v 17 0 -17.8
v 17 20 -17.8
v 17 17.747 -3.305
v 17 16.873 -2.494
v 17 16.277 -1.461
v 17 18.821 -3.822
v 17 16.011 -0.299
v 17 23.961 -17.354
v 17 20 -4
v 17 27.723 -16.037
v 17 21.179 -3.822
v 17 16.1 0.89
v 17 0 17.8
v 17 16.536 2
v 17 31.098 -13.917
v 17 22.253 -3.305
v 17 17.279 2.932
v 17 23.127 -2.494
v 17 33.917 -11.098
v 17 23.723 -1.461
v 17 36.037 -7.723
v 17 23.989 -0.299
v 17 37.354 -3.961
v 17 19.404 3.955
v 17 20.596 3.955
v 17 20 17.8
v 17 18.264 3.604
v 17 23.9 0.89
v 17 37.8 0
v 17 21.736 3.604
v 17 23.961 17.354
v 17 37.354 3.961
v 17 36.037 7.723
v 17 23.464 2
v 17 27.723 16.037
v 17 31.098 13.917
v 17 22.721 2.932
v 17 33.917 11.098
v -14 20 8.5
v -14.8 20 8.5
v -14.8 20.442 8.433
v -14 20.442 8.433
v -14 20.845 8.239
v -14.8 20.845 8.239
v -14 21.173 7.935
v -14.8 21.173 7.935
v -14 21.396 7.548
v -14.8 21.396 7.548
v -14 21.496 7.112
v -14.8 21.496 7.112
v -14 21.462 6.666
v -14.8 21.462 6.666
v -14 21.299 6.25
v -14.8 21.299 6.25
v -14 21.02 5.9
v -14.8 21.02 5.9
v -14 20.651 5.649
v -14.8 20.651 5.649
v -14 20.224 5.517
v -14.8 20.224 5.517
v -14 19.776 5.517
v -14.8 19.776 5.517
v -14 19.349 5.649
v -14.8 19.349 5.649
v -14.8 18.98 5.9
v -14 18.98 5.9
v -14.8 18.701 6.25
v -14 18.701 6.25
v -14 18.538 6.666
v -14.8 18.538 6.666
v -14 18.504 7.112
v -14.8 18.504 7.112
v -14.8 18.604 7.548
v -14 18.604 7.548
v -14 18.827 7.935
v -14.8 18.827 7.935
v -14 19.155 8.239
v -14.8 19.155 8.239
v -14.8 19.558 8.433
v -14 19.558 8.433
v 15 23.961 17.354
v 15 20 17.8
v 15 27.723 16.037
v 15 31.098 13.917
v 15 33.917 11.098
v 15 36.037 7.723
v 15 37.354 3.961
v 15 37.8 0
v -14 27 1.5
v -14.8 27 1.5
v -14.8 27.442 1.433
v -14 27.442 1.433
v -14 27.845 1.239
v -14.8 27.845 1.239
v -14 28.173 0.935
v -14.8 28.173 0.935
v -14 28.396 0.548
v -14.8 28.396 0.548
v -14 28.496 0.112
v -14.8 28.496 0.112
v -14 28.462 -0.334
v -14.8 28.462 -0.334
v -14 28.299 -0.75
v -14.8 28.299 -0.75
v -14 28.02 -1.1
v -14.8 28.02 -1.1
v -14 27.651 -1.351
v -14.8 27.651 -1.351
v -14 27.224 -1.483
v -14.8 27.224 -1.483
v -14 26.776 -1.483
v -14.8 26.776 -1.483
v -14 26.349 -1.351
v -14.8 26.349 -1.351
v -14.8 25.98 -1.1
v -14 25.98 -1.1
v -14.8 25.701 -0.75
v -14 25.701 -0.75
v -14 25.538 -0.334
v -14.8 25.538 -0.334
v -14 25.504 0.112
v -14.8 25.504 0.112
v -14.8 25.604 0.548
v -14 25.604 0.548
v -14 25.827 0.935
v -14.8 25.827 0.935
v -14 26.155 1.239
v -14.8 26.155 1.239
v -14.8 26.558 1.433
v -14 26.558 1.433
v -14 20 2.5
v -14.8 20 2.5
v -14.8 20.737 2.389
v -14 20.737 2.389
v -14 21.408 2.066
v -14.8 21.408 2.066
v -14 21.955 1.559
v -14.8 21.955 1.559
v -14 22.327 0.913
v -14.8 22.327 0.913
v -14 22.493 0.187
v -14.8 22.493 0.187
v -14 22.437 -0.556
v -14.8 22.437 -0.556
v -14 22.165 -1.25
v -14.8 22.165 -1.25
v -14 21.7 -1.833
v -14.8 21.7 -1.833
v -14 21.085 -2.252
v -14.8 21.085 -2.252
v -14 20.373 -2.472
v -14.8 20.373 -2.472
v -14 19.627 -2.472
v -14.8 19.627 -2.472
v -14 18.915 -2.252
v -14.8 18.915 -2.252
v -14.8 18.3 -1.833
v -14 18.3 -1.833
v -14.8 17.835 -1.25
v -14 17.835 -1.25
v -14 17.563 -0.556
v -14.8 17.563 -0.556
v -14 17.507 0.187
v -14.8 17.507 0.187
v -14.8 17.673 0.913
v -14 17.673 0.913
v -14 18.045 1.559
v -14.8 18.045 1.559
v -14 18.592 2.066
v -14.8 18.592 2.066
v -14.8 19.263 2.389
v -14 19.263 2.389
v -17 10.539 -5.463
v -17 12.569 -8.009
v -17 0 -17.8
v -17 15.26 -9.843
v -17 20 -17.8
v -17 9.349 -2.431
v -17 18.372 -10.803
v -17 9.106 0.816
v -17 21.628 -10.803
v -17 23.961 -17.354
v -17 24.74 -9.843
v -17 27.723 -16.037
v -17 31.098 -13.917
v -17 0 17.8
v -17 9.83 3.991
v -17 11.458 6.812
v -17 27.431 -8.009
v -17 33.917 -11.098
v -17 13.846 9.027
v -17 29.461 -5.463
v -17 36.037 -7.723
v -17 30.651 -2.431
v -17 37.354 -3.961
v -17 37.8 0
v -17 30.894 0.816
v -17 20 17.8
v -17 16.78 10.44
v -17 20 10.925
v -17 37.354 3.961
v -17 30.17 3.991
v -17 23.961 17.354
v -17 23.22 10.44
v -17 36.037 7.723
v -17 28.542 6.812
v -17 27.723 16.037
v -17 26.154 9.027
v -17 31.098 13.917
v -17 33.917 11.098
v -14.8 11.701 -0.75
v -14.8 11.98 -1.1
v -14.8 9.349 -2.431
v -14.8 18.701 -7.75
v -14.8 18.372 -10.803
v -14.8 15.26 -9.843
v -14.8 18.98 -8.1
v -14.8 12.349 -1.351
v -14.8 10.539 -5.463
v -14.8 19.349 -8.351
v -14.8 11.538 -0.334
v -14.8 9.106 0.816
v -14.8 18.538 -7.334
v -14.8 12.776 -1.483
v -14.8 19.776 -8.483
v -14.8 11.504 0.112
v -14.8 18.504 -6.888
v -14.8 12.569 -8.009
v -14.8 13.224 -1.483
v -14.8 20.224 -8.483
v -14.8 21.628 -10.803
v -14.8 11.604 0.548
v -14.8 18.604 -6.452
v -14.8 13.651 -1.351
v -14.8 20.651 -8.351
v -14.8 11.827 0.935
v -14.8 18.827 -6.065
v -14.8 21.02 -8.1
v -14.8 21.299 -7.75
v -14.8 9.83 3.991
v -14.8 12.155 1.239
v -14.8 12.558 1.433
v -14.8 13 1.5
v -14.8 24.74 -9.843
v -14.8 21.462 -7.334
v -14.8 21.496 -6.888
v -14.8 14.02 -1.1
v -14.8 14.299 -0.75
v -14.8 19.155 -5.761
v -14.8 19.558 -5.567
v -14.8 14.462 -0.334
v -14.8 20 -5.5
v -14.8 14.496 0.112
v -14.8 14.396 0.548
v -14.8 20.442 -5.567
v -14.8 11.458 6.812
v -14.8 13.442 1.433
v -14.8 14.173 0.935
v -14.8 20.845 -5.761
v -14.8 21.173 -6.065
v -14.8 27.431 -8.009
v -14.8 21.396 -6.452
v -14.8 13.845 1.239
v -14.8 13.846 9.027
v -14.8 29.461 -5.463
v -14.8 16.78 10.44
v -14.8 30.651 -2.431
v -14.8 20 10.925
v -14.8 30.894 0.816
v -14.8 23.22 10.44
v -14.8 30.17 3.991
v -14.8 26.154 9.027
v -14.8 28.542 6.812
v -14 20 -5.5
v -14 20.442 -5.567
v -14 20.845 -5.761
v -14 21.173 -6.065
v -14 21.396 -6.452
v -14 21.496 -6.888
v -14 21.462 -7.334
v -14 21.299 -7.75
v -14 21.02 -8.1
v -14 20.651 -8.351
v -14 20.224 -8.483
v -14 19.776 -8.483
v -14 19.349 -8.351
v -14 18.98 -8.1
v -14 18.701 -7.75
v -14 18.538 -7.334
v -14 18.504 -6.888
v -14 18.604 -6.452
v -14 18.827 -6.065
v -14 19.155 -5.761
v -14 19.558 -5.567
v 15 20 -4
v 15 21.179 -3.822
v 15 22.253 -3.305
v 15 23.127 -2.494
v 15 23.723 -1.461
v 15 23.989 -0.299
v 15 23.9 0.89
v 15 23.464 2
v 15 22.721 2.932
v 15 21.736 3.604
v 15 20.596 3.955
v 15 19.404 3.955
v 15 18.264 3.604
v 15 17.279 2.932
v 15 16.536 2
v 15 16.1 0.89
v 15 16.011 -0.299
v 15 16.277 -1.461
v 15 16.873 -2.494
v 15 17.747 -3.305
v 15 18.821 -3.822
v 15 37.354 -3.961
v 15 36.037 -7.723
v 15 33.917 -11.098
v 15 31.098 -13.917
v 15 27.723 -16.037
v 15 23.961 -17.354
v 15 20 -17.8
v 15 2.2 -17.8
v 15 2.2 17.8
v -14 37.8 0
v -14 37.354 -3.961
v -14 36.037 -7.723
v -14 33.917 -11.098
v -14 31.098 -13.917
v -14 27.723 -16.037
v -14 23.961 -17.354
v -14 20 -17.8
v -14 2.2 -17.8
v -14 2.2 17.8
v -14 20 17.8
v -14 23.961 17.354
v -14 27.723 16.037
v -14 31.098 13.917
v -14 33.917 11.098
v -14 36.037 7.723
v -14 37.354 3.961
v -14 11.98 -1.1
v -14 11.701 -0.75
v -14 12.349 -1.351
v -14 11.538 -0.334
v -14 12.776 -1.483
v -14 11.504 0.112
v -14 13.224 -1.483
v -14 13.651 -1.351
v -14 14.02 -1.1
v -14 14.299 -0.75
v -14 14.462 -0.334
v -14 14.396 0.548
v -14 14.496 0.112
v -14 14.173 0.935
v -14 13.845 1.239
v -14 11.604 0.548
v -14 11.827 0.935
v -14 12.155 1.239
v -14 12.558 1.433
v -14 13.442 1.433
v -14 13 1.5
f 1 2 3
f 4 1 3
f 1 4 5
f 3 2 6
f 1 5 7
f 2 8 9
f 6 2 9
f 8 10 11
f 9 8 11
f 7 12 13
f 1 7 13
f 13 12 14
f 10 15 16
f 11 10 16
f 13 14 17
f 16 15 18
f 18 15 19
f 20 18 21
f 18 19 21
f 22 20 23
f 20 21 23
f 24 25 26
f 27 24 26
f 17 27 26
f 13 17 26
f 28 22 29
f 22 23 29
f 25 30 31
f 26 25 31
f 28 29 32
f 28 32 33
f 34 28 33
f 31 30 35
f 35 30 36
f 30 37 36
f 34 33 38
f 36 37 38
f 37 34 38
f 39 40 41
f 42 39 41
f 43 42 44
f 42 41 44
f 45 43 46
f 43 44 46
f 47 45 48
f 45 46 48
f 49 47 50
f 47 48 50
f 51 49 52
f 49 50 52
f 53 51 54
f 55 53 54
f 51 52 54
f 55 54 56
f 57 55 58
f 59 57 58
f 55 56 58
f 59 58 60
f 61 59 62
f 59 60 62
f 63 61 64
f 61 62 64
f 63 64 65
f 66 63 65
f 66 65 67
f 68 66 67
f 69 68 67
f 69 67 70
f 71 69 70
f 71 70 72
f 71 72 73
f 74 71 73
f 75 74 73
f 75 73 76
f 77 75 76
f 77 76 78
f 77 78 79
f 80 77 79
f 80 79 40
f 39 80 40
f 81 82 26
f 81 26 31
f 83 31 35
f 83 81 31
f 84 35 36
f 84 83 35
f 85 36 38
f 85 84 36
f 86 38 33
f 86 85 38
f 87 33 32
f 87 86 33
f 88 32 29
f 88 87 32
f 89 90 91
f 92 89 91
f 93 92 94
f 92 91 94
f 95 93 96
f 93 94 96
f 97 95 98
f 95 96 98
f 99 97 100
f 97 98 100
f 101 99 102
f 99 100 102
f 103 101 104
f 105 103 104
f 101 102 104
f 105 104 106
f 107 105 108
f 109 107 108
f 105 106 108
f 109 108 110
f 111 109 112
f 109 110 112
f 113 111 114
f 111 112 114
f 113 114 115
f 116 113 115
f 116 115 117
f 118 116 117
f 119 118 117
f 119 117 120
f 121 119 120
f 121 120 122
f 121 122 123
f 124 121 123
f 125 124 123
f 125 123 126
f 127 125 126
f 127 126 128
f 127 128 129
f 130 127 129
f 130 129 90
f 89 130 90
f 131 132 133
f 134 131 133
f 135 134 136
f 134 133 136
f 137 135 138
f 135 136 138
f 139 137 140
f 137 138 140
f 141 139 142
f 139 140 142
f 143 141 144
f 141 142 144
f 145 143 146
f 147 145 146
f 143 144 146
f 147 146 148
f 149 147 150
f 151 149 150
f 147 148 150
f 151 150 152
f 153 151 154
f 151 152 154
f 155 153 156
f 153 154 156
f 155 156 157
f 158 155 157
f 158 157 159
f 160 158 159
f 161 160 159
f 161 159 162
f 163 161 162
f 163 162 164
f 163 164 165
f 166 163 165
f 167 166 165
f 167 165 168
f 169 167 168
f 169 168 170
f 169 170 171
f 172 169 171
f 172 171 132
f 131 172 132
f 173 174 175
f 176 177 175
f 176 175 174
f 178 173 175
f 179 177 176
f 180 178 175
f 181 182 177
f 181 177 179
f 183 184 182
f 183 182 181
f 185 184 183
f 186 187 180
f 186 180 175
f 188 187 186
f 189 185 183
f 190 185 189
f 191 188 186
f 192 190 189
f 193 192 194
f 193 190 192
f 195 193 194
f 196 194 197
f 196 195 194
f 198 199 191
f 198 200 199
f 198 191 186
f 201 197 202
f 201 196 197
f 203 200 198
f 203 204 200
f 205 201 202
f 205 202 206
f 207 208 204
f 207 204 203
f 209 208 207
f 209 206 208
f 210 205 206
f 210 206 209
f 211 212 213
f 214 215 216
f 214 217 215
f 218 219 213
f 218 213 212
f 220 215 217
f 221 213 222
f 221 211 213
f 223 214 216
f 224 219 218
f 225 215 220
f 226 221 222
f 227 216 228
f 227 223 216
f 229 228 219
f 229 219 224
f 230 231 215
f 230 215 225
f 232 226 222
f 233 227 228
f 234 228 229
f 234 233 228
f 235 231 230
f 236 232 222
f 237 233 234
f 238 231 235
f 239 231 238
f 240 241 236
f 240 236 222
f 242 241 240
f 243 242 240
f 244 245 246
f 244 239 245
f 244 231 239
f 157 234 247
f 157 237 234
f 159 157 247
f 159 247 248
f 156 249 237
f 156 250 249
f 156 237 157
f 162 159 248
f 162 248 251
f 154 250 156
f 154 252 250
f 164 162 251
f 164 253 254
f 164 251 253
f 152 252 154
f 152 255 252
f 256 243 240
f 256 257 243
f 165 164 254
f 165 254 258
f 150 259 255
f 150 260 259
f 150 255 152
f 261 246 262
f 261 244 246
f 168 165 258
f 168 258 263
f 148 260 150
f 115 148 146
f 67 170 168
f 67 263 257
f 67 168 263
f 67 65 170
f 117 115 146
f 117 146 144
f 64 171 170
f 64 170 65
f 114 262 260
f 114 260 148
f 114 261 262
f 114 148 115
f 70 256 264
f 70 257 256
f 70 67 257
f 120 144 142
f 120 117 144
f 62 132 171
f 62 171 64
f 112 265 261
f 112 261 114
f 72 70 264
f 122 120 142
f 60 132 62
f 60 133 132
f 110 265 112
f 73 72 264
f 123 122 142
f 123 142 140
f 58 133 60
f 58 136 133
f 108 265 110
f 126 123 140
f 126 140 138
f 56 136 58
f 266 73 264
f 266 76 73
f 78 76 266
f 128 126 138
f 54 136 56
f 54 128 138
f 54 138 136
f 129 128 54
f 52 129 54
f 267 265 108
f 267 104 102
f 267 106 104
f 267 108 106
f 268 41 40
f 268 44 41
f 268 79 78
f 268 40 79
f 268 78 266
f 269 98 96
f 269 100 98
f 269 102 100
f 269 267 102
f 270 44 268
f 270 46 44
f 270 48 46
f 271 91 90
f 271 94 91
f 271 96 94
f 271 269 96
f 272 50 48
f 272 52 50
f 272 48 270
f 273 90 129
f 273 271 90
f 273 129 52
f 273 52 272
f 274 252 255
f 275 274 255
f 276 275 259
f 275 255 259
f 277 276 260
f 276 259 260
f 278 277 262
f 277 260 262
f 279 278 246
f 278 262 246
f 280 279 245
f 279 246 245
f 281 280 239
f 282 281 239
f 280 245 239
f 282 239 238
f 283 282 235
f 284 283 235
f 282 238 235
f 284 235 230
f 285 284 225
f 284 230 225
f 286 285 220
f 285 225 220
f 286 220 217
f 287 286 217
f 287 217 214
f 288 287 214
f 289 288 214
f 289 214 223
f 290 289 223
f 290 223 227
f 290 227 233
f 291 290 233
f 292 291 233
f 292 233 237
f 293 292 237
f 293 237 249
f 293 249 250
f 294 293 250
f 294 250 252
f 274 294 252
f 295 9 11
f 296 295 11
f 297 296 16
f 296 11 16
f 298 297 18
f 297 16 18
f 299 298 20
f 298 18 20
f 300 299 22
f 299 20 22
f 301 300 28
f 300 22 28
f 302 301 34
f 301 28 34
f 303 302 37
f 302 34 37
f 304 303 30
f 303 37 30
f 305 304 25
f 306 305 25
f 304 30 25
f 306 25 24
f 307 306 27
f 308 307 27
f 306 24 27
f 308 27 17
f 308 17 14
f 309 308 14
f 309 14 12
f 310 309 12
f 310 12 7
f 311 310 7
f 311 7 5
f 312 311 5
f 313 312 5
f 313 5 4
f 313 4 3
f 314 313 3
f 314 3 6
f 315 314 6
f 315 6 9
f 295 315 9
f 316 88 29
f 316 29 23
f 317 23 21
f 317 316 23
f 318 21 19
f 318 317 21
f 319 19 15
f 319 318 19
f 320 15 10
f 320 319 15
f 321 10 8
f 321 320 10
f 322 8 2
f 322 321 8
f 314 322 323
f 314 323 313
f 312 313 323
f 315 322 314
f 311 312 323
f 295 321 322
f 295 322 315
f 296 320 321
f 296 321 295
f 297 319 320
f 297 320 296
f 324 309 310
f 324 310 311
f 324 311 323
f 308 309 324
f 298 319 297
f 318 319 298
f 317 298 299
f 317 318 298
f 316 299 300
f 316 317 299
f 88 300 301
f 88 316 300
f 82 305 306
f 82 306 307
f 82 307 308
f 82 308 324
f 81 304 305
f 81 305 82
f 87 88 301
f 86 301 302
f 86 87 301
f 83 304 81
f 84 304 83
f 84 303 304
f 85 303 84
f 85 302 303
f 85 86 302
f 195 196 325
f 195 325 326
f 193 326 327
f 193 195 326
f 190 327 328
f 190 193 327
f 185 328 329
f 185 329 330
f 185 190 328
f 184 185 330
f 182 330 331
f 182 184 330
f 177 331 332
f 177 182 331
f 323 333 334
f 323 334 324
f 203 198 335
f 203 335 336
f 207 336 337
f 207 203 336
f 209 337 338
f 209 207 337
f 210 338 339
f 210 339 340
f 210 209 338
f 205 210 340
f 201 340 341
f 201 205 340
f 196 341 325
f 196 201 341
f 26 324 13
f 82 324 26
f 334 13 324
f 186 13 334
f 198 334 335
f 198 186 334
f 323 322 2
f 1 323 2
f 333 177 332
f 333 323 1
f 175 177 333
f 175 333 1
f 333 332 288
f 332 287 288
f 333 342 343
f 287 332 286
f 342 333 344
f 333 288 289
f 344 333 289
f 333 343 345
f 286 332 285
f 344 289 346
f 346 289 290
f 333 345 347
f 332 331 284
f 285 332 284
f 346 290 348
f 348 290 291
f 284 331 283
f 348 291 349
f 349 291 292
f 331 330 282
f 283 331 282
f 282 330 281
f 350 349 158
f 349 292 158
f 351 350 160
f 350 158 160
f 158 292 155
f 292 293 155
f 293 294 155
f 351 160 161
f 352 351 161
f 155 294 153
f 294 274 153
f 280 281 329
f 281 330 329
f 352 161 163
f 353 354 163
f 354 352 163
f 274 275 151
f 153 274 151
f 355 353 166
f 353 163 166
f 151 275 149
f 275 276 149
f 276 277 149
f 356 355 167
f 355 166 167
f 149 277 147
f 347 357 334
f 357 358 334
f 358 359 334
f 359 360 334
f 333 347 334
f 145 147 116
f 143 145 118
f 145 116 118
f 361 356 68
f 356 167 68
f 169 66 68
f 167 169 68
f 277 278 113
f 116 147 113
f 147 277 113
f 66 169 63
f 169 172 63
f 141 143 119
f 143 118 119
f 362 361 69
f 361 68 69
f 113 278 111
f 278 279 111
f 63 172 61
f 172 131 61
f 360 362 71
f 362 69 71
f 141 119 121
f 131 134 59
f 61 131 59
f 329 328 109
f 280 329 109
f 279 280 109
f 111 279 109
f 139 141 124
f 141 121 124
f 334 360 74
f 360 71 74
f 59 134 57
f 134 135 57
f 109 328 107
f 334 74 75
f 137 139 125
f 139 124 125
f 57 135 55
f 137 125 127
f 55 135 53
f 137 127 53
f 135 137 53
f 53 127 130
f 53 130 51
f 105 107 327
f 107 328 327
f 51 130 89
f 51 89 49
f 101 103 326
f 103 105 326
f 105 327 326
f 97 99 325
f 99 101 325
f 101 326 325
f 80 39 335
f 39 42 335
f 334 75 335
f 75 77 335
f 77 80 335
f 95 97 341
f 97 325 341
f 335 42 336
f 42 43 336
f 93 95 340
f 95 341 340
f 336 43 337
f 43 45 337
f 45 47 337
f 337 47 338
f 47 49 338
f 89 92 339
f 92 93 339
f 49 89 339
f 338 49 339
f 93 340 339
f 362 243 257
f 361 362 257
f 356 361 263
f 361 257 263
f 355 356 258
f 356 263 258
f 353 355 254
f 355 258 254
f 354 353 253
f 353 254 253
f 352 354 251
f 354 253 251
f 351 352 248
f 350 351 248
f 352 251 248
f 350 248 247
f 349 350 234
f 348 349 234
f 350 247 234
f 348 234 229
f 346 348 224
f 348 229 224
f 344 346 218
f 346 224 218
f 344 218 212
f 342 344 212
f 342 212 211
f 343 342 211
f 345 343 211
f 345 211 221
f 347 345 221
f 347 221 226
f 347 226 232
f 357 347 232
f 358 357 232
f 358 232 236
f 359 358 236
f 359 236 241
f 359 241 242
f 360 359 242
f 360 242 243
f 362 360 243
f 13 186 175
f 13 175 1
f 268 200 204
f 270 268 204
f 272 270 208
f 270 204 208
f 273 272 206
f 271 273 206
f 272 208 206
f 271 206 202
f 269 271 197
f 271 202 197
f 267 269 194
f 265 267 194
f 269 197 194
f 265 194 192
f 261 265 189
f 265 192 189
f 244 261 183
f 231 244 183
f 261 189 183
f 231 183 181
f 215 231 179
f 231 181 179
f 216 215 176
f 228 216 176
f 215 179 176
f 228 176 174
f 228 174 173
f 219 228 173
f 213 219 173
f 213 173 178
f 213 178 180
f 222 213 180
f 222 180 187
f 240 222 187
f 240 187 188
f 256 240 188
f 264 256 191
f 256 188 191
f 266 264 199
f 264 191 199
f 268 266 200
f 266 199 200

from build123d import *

# Parameters (mm, degrees)
SKETCH1_W           = 34
SKETCH1_H           = 35.6
BOSS_EXTRUDE1_DEPTH = 2.2
BOSS_EXTRUDE2_DEPTH = 3
BOSS_EXTRUDE3_START = -32
BOSS_EXTRUDE3_DEPTH = 2
SKETCH4_R           = 2.5
SKETCH4_R_2         = 1.5
CUT_EXTRUDE1_DEPTH  = 12
SKETCH4_3_R         = 10.925
SKETCH4_3_R_2       = 1.5
SKETCH4_3_R_3       = 2.5
CUT_EXTRUDE2_DEPTH  = 2.2
SKETCH5_R           = 4
CUT_EXTRUDE3_DEPTH  = 12.2


with BuildPart() as part:
    # Sketch1 → Boss-Extrude1 (new body)
    with BuildSketch(Plane(origin=(0, 0, 0), x_dir=(1, 0, 0), z_dir=(0, 1, 0))):
        Rectangle(SKETCH1_W, SKETCH1_H)
    extrude(amount=BOSS_EXTRUDE1_DEPTH)

    # Sketch3 → Boss-Extrude2 (add)
    with BuildSketch(Plane.ZY.offset(17)):
        with BuildLine():
            Line((0, 37.8), (0, 2.2))
            Line((0, 2.2), (17.8, 2.2))
            Line((17.8, 2.2), (17.8, 20))
            ThreePointArc((17.8, 20), (12.586500705, 32.586500705), (0, 37.8))
        make_face()
        with BuildLine():
            Line((-17.8, 2.2), (0, 2.2))
            Line((0, 2.2), (0, 37.8))
            ThreePointArc((0, 37.8), (-12.586500705, 32.586500705), (-17.8, 20))
            Line((-17.8, 20), (-17.8, 2.2))
        make_face()
    extrude(amount=-BOSS_EXTRUDE2_DEPTH)

    # Sketch3<4> → Boss-Extrude3 (add)
    with BuildSketch(Plane.ZY.offset(17).offset(BOSS_EXTRUDE3_START)):
        with BuildLine():
            Line((-17.8, 2.2), (0, 2.2))
            Line((0, 2.2), (0, 37.8))
            ThreePointArc((0, 37.8), (-12.586500705, 32.586500705), (-17.8, 20))
            Line((-17.8, 20), (-17.8, 2.2))
        make_face()
        with BuildLine():
            Line((0, 37.8), (0, 2.2))
            Line((0, 2.2), (17.8, 2.2))
            Line((17.8, 2.2), (17.8, 20))
            ThreePointArc((17.8, 20), (12.586500705, 32.586500705), (0, 37.8))
        make_face()
    extrude(amount=-BOSS_EXTRUDE3_DEPTH)

    # Sketch4 → Cut-Extrude1 (cut)
    with BuildSketch(Plane.ZY.offset(17)):
        with Locations((0, 20)):
            Circle(SKETCH4_R)
        with Locations((7, 20)):
            Circle(SKETCH4_R_2)
        with Locations((0, 27)):
            Circle(SKETCH4_R_2)
        with Locations((-7, 20)):
            Circle(SKETCH4_R_2)
        with Locations((0, 13)):
            Circle(SKETCH4_R_2)
    extrude(amount=-CUT_EXTRUDE1_DEPTH, mode=Mode.SUBTRACT)

    # Sketch4<3> → Cut-Extrude2 (cut)
    with BuildSketch(Plane.ZY.offset(17)):
        with Locations((0, 20)):
            Circle(SKETCH4_3_R)
        with Locations((0, 27)):
            Circle(SKETCH4_3_R_2, mode=Mode.SUBTRACT)
        with Locations((0, 13)):
            Circle(SKETCH4_3_R_2, mode=Mode.SUBTRACT)
        with Locations((-7, 20)):
            Circle(SKETCH4_3_R_2, mode=Mode.SUBTRACT)
        with Locations((7, 20)):
            Circle(SKETCH4_3_R_2, mode=Mode.SUBTRACT)
        with Locations((0, 20)):
            Circle(SKETCH4_3_R_3, mode=Mode.SUBTRACT)
    extrude(amount=-CUT_EXTRUDE2_DEPTH, mode=Mode.SUBTRACT)

    # Sketch5 → Cut-Extrude3 (cut)
    with BuildSketch(Plane(origin=(17, 0, 0), x_dir=(0, 0, -1), z_dir=(1, 0, 0))):
        with Locations((0, 20)):
            Circle(SKETCH5_R)
    extrude(amount=-CUT_EXTRUDE3_DEPTH, mode=Mode.SUBTRACT)


solid = part.part
